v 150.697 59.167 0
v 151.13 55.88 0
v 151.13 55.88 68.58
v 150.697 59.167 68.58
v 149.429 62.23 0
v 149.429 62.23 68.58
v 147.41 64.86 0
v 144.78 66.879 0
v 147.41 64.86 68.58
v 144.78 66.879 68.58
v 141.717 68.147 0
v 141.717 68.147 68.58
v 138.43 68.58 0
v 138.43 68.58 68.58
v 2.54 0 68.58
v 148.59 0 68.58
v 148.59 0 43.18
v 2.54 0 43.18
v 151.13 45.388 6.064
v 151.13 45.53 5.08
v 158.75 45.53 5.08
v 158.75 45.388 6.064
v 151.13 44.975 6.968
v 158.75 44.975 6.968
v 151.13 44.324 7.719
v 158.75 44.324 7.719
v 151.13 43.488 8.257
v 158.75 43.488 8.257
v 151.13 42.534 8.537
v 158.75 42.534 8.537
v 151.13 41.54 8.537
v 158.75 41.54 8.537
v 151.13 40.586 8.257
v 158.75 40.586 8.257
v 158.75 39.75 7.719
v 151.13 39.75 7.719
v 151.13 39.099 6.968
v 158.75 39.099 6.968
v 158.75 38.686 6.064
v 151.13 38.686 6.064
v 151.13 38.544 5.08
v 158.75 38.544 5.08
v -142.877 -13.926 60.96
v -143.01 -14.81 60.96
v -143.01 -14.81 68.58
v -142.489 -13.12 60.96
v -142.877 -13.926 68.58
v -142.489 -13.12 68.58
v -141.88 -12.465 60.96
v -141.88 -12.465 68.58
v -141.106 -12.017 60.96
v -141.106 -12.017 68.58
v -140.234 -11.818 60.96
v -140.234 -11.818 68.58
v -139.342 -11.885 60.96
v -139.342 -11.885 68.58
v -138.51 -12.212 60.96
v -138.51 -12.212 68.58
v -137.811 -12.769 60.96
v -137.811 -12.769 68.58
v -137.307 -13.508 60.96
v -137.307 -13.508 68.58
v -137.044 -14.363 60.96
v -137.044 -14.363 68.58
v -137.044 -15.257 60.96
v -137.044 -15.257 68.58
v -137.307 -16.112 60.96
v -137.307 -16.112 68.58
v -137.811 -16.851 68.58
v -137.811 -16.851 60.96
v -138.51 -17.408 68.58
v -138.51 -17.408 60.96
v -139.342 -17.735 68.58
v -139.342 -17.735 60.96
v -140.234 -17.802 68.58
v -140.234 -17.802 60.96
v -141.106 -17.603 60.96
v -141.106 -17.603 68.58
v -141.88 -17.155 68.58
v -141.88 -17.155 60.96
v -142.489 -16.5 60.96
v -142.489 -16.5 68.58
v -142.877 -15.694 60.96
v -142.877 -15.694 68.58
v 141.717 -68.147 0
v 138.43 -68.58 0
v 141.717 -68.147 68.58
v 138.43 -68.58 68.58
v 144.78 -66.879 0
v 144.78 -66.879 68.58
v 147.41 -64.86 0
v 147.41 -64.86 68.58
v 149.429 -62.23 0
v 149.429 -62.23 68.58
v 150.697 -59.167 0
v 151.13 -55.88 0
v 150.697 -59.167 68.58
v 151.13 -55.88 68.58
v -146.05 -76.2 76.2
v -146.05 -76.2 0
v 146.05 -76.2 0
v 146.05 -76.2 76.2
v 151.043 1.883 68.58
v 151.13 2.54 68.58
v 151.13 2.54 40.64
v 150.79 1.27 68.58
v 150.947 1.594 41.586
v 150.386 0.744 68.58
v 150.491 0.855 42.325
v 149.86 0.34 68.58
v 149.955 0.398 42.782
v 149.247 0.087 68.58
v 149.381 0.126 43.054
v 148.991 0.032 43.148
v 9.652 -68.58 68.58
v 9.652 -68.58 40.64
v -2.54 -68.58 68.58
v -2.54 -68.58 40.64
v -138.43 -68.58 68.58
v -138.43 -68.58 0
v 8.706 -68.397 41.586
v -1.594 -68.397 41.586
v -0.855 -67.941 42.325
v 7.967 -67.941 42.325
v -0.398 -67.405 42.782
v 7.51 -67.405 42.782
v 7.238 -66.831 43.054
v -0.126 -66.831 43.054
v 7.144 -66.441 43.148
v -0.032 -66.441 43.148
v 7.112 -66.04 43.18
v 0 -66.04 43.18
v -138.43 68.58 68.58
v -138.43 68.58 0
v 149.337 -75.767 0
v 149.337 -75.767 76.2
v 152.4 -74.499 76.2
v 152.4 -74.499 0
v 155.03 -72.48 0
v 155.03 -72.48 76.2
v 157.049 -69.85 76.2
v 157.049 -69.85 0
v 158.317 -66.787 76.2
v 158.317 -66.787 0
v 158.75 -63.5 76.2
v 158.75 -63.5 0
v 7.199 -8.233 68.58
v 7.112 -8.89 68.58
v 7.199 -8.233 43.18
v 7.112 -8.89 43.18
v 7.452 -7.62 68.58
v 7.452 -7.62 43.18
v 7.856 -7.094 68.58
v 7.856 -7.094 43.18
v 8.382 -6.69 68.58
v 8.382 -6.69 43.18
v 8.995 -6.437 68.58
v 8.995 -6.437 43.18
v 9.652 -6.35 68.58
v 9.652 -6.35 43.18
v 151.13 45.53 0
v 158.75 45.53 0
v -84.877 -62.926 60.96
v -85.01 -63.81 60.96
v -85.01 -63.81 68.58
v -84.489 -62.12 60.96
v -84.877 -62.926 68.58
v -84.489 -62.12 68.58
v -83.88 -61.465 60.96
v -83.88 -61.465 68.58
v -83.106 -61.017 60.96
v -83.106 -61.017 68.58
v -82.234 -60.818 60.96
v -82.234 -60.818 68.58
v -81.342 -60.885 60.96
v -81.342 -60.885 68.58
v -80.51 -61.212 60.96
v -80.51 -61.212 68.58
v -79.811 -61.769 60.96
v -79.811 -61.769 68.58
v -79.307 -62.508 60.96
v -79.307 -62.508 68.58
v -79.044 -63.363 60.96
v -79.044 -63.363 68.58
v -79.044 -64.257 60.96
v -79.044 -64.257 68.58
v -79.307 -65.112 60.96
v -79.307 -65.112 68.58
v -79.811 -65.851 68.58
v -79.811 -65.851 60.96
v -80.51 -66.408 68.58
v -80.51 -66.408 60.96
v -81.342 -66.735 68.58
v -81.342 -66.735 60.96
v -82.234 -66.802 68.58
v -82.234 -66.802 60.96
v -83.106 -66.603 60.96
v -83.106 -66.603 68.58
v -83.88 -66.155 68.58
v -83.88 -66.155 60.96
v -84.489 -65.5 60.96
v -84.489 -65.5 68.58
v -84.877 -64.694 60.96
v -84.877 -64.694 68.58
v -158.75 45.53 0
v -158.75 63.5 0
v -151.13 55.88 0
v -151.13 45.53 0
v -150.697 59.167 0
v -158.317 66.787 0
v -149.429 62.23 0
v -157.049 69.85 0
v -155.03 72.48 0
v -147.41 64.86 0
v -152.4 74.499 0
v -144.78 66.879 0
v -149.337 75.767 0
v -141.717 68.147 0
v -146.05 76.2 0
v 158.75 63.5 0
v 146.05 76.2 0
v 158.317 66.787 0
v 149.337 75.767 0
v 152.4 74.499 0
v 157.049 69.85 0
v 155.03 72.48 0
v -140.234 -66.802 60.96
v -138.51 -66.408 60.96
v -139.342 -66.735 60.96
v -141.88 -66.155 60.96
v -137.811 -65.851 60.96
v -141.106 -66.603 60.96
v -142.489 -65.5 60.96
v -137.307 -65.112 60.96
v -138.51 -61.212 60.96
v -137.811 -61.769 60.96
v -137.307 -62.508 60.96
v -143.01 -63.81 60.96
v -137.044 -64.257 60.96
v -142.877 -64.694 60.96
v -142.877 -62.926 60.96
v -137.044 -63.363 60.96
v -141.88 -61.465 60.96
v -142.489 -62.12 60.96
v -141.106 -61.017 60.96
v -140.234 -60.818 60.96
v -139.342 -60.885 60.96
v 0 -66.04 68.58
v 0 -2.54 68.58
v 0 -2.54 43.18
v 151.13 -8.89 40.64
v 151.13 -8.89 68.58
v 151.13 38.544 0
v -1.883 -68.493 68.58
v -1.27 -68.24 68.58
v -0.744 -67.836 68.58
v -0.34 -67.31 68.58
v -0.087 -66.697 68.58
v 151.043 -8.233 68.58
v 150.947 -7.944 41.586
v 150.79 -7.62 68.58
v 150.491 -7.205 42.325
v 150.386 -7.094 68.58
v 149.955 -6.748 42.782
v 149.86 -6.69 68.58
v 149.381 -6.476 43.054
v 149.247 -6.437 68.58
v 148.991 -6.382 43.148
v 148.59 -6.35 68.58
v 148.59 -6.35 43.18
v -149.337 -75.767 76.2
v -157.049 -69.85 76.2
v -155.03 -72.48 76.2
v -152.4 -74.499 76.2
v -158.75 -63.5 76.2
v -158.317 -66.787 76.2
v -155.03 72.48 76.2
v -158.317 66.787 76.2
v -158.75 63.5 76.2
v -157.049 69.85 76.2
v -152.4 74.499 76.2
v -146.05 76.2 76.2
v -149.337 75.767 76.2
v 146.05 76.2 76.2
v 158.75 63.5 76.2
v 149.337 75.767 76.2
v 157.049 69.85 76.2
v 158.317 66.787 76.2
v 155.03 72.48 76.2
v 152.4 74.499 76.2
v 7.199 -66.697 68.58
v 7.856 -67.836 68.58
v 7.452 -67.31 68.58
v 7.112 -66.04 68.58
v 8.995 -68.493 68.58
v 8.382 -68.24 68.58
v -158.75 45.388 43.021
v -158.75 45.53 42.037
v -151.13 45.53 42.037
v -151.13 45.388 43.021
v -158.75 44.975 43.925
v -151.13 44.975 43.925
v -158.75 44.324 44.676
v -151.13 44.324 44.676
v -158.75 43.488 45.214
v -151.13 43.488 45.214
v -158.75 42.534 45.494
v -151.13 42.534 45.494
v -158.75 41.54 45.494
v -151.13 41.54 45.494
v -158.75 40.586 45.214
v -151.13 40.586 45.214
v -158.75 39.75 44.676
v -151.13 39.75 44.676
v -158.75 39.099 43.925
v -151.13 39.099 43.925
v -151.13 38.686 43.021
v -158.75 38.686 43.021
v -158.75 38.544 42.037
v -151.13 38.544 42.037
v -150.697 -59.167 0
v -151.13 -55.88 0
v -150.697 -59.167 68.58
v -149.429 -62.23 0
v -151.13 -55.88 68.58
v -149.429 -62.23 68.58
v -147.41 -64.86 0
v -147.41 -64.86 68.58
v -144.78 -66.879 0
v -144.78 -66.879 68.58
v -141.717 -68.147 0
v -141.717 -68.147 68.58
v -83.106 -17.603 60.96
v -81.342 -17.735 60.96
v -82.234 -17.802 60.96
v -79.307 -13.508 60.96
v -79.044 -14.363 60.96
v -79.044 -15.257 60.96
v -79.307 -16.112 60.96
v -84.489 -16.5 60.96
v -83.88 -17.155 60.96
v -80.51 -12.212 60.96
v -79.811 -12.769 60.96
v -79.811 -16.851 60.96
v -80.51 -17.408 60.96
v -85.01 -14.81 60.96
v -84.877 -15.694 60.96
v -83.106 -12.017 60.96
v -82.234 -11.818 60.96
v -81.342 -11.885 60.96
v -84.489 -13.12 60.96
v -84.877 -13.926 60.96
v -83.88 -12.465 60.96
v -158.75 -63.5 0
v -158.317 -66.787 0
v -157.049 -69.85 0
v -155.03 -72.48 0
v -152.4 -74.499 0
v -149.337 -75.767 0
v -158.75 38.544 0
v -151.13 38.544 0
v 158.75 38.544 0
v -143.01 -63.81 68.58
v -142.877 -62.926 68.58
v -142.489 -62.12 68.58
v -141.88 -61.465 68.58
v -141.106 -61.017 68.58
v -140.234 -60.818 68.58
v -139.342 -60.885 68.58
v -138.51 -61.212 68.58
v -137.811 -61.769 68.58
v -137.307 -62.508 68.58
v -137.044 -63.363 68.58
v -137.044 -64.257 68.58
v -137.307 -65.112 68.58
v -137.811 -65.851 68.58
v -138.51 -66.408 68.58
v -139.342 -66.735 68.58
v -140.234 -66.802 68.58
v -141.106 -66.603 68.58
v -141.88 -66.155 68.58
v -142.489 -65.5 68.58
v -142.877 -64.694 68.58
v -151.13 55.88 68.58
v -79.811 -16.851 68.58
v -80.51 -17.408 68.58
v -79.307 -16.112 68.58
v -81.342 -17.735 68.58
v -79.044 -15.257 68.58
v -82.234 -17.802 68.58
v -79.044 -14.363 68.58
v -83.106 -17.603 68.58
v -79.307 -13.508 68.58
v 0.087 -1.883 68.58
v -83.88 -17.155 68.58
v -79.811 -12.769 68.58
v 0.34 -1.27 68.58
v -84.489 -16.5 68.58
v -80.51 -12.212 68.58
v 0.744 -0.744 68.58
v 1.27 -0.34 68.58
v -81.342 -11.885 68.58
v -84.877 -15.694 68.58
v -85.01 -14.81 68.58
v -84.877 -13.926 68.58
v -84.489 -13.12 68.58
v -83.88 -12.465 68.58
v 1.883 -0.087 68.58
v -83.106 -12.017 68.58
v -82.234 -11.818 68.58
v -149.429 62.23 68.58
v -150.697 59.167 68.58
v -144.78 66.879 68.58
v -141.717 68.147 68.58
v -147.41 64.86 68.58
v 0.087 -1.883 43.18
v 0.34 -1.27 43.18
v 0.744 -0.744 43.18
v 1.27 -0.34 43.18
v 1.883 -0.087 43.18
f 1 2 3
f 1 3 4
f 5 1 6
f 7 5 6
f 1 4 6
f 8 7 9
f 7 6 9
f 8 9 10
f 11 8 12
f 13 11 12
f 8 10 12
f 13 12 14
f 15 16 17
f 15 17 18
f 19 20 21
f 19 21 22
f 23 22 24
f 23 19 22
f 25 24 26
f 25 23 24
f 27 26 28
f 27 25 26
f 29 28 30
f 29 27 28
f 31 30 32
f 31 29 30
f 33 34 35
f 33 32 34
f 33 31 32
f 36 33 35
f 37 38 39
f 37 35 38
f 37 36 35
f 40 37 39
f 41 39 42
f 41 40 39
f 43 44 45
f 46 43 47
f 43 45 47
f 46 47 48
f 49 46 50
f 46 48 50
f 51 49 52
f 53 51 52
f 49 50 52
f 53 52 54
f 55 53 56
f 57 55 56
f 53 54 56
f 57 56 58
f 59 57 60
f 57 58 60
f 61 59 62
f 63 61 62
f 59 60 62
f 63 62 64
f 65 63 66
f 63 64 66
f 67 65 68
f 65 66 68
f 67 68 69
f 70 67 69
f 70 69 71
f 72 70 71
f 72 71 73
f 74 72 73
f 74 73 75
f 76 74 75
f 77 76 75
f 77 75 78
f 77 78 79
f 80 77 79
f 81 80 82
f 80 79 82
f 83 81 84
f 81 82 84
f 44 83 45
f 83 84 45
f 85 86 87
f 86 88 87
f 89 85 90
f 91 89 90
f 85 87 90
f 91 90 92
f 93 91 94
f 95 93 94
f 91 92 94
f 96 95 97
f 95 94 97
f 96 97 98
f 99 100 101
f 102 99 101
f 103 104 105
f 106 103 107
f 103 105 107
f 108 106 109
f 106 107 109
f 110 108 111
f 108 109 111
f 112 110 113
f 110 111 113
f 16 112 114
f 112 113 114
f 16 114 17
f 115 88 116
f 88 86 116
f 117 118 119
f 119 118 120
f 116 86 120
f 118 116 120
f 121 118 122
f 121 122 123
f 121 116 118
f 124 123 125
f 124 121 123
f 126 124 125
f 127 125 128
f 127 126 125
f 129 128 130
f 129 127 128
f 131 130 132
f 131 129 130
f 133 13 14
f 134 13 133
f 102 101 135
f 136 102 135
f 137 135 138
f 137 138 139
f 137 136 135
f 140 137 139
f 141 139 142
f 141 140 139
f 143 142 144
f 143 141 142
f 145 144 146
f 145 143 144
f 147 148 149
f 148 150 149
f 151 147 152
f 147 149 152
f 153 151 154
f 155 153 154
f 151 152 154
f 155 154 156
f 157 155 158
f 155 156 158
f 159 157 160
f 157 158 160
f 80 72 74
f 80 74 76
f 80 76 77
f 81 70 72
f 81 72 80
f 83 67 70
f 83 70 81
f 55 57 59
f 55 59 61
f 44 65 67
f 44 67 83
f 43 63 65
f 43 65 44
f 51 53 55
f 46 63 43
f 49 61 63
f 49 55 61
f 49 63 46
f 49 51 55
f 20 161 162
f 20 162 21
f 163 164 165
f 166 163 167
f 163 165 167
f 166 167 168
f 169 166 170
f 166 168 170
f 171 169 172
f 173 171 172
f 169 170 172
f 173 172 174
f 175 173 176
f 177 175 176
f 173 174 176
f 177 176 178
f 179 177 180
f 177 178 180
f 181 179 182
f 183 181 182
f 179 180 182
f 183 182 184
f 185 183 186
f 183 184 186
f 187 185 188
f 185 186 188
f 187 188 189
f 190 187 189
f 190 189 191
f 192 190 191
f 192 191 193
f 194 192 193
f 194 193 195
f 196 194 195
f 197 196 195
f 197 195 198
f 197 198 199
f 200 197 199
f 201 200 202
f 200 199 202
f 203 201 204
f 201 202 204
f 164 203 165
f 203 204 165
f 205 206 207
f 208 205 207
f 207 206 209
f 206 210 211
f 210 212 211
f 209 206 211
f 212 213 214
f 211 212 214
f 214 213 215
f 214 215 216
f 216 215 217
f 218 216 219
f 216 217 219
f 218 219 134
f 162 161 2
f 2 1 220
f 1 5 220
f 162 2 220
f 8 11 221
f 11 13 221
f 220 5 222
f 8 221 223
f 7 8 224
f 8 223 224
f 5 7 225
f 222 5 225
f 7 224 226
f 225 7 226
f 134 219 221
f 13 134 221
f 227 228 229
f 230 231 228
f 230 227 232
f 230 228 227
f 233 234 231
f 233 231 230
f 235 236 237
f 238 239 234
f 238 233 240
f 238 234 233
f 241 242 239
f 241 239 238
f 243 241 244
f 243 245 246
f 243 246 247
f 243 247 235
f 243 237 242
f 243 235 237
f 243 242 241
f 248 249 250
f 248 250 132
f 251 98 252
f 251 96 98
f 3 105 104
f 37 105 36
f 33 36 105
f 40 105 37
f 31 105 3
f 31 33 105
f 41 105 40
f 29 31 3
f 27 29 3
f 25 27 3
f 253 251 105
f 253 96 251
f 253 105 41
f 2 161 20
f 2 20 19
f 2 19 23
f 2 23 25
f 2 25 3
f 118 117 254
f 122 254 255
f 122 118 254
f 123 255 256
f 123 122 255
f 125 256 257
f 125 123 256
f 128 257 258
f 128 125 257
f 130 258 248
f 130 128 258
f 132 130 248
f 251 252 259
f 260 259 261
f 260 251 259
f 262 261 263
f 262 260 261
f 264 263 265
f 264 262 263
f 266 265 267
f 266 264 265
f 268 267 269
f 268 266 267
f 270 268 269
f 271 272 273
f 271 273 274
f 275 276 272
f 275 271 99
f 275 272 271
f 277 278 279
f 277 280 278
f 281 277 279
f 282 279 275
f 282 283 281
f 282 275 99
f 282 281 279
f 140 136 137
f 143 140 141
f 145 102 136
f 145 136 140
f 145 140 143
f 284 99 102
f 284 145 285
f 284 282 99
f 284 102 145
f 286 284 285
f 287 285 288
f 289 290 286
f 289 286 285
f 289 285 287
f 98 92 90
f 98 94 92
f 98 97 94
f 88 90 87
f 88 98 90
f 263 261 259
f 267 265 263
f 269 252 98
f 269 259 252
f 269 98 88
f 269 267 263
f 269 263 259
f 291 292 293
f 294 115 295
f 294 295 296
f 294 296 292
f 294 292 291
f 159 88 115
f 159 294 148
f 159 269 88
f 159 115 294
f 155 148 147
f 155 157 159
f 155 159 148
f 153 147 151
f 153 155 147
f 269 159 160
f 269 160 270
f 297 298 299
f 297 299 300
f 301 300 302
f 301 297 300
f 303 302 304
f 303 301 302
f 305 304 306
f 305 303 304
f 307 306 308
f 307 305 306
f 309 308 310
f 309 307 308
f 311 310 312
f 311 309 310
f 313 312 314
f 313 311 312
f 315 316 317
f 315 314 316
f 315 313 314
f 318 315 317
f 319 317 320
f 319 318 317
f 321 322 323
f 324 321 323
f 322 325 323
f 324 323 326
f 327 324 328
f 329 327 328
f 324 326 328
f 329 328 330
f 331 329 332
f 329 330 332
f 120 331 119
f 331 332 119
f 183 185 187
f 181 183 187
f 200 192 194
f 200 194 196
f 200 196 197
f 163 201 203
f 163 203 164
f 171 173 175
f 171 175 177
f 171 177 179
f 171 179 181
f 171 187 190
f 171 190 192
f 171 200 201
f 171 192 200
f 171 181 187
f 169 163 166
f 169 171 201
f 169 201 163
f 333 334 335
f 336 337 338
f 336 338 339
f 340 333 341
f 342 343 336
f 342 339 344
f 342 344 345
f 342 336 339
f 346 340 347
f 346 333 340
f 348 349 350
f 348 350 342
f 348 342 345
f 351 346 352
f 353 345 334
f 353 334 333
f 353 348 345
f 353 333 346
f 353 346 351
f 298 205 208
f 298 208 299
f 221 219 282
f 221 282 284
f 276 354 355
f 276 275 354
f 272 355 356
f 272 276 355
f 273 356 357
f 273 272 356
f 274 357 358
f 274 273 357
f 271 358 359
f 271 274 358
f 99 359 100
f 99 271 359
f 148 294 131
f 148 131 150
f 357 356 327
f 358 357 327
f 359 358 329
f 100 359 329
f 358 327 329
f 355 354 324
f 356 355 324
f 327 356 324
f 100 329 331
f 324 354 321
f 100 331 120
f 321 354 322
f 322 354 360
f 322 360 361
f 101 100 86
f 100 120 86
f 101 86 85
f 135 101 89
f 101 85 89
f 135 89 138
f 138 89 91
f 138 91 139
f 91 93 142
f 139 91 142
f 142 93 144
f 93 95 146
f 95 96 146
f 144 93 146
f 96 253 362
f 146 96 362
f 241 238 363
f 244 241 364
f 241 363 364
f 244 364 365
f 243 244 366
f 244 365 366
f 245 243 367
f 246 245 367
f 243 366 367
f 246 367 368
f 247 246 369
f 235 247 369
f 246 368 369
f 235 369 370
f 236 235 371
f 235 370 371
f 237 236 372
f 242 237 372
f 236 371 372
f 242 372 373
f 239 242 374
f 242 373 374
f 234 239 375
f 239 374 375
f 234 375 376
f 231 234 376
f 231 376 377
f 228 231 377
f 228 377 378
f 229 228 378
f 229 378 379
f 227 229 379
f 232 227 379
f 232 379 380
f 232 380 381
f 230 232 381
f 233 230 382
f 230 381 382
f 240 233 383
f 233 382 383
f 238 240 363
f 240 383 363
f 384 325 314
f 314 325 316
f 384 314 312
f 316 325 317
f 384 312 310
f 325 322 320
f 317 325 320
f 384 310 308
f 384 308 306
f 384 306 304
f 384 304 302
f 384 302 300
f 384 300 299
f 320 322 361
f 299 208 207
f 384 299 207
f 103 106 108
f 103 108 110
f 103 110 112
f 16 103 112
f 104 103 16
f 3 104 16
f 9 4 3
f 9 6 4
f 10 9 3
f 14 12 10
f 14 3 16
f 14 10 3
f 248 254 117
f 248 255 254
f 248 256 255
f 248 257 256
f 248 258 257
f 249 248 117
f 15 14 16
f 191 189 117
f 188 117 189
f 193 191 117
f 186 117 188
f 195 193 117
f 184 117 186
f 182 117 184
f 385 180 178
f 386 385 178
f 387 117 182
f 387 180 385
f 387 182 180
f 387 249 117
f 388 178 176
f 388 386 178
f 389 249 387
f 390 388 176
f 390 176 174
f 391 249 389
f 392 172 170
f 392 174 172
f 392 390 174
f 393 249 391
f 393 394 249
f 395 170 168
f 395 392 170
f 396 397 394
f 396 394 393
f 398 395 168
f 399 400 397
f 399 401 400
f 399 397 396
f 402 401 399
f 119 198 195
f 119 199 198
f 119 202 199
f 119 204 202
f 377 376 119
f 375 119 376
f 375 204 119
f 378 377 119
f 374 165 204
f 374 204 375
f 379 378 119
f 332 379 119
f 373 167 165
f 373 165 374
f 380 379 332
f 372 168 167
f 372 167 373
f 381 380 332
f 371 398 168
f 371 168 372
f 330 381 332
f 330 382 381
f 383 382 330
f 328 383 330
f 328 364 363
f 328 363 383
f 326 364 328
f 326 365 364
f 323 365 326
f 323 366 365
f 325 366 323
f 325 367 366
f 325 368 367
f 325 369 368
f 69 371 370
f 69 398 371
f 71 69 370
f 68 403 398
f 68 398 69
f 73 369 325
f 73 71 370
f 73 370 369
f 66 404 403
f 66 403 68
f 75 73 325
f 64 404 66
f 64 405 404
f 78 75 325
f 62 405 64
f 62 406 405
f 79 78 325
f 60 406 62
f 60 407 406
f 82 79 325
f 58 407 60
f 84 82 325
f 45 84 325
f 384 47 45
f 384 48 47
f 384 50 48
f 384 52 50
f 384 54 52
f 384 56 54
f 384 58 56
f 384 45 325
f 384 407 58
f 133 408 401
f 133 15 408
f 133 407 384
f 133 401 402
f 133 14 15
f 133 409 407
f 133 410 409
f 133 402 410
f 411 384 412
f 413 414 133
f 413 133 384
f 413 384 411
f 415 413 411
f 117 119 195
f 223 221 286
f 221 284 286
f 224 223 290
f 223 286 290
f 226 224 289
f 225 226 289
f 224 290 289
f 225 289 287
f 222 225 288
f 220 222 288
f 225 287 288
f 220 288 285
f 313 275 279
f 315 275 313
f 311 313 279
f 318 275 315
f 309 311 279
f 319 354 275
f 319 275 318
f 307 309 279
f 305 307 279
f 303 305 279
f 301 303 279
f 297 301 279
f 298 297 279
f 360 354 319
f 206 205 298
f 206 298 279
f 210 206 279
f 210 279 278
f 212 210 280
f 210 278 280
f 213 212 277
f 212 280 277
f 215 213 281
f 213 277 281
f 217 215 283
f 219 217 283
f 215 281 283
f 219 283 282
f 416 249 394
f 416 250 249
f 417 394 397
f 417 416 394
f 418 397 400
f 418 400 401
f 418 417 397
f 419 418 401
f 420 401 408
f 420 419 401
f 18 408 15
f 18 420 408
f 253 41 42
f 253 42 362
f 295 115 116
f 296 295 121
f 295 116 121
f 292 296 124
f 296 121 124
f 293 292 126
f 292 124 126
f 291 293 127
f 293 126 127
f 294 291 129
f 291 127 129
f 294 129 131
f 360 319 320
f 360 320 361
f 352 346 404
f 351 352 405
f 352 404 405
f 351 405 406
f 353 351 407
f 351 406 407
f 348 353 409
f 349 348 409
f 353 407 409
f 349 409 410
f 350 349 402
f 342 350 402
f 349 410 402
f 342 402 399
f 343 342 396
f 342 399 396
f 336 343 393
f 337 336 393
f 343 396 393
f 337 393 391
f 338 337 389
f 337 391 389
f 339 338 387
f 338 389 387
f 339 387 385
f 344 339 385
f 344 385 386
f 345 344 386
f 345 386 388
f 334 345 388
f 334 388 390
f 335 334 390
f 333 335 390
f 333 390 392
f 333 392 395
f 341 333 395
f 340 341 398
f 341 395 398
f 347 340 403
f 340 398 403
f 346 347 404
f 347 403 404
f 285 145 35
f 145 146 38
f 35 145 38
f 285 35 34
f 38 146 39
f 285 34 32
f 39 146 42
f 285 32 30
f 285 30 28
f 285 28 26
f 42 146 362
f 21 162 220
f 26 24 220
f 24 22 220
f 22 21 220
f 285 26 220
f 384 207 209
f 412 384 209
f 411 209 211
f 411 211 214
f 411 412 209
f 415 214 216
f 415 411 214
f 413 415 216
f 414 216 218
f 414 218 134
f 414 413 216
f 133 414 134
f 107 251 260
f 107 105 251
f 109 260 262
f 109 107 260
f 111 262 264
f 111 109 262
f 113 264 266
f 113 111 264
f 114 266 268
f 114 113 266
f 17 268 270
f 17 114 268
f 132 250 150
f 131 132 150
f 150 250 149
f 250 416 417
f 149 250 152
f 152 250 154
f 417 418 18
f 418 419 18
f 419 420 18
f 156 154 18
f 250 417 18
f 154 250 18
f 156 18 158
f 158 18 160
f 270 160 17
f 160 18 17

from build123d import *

# Parameters (mm, degrees)
SKETCH1_W           = 317.5
SKETCH1_H           = 152.4
BOSS_EXTRUDE1_DEPTH = 76.2
SKETCH2_W           = 302.26
SKETCH2_H           = 137.16
CUT_EXTRUDE1_DEPTH  = 68.58
CUT_EXTRUDE2_REACH  = 319.5
BOSS_EXTRUDE2_DEPTH = 25.4
CUT_EXTRUDE3_REACH  = 9.62
SKETCH7_R           = 3
BOSS_EXTRUDE4_DEPTH = 7.62
FILLET2_R           = 12.7
FILLET3_R           = 2.54


with BuildPart() as part:
    # Sketch1 → Boss-Extrude1 (new body)
    with BuildSketch(Plane.XY):
        Rectangle(SKETCH1_W, SKETCH1_H)
    extrude(amount=BOSS_EXTRUDE1_DEPTH)

    # Sketch2 → Cut-Extrude1 (cut)
    with BuildSketch(Plane(origin=(0, 0, 0), x_dir=(-1, 0, 0), z_dir=(0, 0, -1))):
        Rectangle(SKETCH2_W, SKETCH2_H)
    extrude(amount=-CUT_EXTRUDE1_DEPTH, mode=Mode.SUBTRACT)

    # Sketch3 → Cut-Extrude2 (cut, up to next)
    with BuildSketch(Plane.ZY.offset(158.75), mode=Mode.PRIVATE) as cut_extrude2_sk1:
        with BuildLine():
            Line((42.037, 38.5445), (0, 38.5445))
            Line((0, 38.5445), (0, 45.5295))
            Line((0, 45.5295), (42.037, 45.5295))
            ThreePointArc((42.037, 45.5295), (45.5295, 42.037), (42.037, 38.5445))
        make_face()
    cut_extrude2_tool1 = extrude(cut_extrude2_sk1.sketch, amount=-CUT_EXTRUDE2_REACH, mode=Mode.PRIVATE) & part.part
    add(cut_extrude2_tool1.solids().sort_by_distance((-158.75, 42.037, 22.396786))[0], mode=Mode.SUBTRACT)

    # Sketch4 → Boss-Extrude2 (add)
    with BuildSketch(Plane(origin=(0, 0, 68.58), x_dir=(-1, 0, 0), z_dir=(0, 0, -1))):
        Polygon((-151.13, 0), (0, 0), (0, -68.58), (-7.112, -68.58), (-7.112, -6.35), (-151.13, -6.35), align=None)
    extrude(amount=BOSS_EXTRUDE2_DEPTH)

    # Sketch5 → Cut-Extrude3 (cut, up to next)
    with BuildSketch(Plane.ZY.offset(-151.13), mode=Mode.PRIVATE) as cut_extrude3_sk1:
        with BuildLine():
            Line((5.08, 38.5445), (0, 38.5445))
            Line((0, 38.5445), (0, 45.5295))
            Line((0, 45.5295), (5.08, 45.5295))
            ThreePointArc((5.08, 45.5295), (8.5725, 42.037), (5.08, 38.5445))
        make_face()
    cut_extrude3_tool1 = extrude(cut_extrude3_sk1.sketch, amount=-CUT_EXTRUDE3_REACH, mode=Mode.PRIVATE) & part.part
    add(cut_extrude3_tool1.solids().sort_by_distance((151.13, 42.037, 3.950338))[0], mode=Mode.SUBTRACT)

    # Sketch7 → Boss-Extrude4 (add)
    with BuildSketch(Plane(origin=(0, 0, 68.58), x_dir=(-1, 0, 0), z_dir=(0, 0, -1))):
        with Locations((140.01, -63.81)):
            Circle(SKETCH7_R)
        with Locations((82.01, -63.81)):
            Circle(SKETCH7_R)
        with Locations((140.01, -14.81)):
            Circle(SKETCH7_R)
        with Locations((82.01, -14.81)):
            Circle(SKETCH7_R)
    extrude(amount=BOSS_EXTRUDE4_DEPTH)

    # Fillet2
    fillet2_edges = [part.edges().sort_by_distance(p)[0] for p in [
        (-151.13, 68.58, 34.29),
        (151.13, 68.58, 34.29),
        (151.13, -68.58, 34.29),
        (-151.13, -68.58, 34.29),
        (-158.75, 76.2, 38.1),
        (158.75, 76.2, 38.1),
        (158.75, -76.2, 38.1),
        (-158.75, -76.2, 38.1),
    ]]
    fillet(fillet2_edges, radius=FILLET2_R)

    # Fillet3
    fillet3_edges = [part.edges().sort_by_distance(p)[0] for p in [
        (151.13, 0, 55.88),
        (151.13, -6.35, 55.88),
        (7.112, -6.35, 55.88),
        (7.112, -68.58, 55.88),
        (0, -68.58, 55.88),
        (0, 0, 55.88),
        (151.13, -3.175, 43.18),
        (3.556, -68.58, 43.18),
    ]]
    fillet(fillet3_edges, radius=FILLET3_R)


solid = part.part
